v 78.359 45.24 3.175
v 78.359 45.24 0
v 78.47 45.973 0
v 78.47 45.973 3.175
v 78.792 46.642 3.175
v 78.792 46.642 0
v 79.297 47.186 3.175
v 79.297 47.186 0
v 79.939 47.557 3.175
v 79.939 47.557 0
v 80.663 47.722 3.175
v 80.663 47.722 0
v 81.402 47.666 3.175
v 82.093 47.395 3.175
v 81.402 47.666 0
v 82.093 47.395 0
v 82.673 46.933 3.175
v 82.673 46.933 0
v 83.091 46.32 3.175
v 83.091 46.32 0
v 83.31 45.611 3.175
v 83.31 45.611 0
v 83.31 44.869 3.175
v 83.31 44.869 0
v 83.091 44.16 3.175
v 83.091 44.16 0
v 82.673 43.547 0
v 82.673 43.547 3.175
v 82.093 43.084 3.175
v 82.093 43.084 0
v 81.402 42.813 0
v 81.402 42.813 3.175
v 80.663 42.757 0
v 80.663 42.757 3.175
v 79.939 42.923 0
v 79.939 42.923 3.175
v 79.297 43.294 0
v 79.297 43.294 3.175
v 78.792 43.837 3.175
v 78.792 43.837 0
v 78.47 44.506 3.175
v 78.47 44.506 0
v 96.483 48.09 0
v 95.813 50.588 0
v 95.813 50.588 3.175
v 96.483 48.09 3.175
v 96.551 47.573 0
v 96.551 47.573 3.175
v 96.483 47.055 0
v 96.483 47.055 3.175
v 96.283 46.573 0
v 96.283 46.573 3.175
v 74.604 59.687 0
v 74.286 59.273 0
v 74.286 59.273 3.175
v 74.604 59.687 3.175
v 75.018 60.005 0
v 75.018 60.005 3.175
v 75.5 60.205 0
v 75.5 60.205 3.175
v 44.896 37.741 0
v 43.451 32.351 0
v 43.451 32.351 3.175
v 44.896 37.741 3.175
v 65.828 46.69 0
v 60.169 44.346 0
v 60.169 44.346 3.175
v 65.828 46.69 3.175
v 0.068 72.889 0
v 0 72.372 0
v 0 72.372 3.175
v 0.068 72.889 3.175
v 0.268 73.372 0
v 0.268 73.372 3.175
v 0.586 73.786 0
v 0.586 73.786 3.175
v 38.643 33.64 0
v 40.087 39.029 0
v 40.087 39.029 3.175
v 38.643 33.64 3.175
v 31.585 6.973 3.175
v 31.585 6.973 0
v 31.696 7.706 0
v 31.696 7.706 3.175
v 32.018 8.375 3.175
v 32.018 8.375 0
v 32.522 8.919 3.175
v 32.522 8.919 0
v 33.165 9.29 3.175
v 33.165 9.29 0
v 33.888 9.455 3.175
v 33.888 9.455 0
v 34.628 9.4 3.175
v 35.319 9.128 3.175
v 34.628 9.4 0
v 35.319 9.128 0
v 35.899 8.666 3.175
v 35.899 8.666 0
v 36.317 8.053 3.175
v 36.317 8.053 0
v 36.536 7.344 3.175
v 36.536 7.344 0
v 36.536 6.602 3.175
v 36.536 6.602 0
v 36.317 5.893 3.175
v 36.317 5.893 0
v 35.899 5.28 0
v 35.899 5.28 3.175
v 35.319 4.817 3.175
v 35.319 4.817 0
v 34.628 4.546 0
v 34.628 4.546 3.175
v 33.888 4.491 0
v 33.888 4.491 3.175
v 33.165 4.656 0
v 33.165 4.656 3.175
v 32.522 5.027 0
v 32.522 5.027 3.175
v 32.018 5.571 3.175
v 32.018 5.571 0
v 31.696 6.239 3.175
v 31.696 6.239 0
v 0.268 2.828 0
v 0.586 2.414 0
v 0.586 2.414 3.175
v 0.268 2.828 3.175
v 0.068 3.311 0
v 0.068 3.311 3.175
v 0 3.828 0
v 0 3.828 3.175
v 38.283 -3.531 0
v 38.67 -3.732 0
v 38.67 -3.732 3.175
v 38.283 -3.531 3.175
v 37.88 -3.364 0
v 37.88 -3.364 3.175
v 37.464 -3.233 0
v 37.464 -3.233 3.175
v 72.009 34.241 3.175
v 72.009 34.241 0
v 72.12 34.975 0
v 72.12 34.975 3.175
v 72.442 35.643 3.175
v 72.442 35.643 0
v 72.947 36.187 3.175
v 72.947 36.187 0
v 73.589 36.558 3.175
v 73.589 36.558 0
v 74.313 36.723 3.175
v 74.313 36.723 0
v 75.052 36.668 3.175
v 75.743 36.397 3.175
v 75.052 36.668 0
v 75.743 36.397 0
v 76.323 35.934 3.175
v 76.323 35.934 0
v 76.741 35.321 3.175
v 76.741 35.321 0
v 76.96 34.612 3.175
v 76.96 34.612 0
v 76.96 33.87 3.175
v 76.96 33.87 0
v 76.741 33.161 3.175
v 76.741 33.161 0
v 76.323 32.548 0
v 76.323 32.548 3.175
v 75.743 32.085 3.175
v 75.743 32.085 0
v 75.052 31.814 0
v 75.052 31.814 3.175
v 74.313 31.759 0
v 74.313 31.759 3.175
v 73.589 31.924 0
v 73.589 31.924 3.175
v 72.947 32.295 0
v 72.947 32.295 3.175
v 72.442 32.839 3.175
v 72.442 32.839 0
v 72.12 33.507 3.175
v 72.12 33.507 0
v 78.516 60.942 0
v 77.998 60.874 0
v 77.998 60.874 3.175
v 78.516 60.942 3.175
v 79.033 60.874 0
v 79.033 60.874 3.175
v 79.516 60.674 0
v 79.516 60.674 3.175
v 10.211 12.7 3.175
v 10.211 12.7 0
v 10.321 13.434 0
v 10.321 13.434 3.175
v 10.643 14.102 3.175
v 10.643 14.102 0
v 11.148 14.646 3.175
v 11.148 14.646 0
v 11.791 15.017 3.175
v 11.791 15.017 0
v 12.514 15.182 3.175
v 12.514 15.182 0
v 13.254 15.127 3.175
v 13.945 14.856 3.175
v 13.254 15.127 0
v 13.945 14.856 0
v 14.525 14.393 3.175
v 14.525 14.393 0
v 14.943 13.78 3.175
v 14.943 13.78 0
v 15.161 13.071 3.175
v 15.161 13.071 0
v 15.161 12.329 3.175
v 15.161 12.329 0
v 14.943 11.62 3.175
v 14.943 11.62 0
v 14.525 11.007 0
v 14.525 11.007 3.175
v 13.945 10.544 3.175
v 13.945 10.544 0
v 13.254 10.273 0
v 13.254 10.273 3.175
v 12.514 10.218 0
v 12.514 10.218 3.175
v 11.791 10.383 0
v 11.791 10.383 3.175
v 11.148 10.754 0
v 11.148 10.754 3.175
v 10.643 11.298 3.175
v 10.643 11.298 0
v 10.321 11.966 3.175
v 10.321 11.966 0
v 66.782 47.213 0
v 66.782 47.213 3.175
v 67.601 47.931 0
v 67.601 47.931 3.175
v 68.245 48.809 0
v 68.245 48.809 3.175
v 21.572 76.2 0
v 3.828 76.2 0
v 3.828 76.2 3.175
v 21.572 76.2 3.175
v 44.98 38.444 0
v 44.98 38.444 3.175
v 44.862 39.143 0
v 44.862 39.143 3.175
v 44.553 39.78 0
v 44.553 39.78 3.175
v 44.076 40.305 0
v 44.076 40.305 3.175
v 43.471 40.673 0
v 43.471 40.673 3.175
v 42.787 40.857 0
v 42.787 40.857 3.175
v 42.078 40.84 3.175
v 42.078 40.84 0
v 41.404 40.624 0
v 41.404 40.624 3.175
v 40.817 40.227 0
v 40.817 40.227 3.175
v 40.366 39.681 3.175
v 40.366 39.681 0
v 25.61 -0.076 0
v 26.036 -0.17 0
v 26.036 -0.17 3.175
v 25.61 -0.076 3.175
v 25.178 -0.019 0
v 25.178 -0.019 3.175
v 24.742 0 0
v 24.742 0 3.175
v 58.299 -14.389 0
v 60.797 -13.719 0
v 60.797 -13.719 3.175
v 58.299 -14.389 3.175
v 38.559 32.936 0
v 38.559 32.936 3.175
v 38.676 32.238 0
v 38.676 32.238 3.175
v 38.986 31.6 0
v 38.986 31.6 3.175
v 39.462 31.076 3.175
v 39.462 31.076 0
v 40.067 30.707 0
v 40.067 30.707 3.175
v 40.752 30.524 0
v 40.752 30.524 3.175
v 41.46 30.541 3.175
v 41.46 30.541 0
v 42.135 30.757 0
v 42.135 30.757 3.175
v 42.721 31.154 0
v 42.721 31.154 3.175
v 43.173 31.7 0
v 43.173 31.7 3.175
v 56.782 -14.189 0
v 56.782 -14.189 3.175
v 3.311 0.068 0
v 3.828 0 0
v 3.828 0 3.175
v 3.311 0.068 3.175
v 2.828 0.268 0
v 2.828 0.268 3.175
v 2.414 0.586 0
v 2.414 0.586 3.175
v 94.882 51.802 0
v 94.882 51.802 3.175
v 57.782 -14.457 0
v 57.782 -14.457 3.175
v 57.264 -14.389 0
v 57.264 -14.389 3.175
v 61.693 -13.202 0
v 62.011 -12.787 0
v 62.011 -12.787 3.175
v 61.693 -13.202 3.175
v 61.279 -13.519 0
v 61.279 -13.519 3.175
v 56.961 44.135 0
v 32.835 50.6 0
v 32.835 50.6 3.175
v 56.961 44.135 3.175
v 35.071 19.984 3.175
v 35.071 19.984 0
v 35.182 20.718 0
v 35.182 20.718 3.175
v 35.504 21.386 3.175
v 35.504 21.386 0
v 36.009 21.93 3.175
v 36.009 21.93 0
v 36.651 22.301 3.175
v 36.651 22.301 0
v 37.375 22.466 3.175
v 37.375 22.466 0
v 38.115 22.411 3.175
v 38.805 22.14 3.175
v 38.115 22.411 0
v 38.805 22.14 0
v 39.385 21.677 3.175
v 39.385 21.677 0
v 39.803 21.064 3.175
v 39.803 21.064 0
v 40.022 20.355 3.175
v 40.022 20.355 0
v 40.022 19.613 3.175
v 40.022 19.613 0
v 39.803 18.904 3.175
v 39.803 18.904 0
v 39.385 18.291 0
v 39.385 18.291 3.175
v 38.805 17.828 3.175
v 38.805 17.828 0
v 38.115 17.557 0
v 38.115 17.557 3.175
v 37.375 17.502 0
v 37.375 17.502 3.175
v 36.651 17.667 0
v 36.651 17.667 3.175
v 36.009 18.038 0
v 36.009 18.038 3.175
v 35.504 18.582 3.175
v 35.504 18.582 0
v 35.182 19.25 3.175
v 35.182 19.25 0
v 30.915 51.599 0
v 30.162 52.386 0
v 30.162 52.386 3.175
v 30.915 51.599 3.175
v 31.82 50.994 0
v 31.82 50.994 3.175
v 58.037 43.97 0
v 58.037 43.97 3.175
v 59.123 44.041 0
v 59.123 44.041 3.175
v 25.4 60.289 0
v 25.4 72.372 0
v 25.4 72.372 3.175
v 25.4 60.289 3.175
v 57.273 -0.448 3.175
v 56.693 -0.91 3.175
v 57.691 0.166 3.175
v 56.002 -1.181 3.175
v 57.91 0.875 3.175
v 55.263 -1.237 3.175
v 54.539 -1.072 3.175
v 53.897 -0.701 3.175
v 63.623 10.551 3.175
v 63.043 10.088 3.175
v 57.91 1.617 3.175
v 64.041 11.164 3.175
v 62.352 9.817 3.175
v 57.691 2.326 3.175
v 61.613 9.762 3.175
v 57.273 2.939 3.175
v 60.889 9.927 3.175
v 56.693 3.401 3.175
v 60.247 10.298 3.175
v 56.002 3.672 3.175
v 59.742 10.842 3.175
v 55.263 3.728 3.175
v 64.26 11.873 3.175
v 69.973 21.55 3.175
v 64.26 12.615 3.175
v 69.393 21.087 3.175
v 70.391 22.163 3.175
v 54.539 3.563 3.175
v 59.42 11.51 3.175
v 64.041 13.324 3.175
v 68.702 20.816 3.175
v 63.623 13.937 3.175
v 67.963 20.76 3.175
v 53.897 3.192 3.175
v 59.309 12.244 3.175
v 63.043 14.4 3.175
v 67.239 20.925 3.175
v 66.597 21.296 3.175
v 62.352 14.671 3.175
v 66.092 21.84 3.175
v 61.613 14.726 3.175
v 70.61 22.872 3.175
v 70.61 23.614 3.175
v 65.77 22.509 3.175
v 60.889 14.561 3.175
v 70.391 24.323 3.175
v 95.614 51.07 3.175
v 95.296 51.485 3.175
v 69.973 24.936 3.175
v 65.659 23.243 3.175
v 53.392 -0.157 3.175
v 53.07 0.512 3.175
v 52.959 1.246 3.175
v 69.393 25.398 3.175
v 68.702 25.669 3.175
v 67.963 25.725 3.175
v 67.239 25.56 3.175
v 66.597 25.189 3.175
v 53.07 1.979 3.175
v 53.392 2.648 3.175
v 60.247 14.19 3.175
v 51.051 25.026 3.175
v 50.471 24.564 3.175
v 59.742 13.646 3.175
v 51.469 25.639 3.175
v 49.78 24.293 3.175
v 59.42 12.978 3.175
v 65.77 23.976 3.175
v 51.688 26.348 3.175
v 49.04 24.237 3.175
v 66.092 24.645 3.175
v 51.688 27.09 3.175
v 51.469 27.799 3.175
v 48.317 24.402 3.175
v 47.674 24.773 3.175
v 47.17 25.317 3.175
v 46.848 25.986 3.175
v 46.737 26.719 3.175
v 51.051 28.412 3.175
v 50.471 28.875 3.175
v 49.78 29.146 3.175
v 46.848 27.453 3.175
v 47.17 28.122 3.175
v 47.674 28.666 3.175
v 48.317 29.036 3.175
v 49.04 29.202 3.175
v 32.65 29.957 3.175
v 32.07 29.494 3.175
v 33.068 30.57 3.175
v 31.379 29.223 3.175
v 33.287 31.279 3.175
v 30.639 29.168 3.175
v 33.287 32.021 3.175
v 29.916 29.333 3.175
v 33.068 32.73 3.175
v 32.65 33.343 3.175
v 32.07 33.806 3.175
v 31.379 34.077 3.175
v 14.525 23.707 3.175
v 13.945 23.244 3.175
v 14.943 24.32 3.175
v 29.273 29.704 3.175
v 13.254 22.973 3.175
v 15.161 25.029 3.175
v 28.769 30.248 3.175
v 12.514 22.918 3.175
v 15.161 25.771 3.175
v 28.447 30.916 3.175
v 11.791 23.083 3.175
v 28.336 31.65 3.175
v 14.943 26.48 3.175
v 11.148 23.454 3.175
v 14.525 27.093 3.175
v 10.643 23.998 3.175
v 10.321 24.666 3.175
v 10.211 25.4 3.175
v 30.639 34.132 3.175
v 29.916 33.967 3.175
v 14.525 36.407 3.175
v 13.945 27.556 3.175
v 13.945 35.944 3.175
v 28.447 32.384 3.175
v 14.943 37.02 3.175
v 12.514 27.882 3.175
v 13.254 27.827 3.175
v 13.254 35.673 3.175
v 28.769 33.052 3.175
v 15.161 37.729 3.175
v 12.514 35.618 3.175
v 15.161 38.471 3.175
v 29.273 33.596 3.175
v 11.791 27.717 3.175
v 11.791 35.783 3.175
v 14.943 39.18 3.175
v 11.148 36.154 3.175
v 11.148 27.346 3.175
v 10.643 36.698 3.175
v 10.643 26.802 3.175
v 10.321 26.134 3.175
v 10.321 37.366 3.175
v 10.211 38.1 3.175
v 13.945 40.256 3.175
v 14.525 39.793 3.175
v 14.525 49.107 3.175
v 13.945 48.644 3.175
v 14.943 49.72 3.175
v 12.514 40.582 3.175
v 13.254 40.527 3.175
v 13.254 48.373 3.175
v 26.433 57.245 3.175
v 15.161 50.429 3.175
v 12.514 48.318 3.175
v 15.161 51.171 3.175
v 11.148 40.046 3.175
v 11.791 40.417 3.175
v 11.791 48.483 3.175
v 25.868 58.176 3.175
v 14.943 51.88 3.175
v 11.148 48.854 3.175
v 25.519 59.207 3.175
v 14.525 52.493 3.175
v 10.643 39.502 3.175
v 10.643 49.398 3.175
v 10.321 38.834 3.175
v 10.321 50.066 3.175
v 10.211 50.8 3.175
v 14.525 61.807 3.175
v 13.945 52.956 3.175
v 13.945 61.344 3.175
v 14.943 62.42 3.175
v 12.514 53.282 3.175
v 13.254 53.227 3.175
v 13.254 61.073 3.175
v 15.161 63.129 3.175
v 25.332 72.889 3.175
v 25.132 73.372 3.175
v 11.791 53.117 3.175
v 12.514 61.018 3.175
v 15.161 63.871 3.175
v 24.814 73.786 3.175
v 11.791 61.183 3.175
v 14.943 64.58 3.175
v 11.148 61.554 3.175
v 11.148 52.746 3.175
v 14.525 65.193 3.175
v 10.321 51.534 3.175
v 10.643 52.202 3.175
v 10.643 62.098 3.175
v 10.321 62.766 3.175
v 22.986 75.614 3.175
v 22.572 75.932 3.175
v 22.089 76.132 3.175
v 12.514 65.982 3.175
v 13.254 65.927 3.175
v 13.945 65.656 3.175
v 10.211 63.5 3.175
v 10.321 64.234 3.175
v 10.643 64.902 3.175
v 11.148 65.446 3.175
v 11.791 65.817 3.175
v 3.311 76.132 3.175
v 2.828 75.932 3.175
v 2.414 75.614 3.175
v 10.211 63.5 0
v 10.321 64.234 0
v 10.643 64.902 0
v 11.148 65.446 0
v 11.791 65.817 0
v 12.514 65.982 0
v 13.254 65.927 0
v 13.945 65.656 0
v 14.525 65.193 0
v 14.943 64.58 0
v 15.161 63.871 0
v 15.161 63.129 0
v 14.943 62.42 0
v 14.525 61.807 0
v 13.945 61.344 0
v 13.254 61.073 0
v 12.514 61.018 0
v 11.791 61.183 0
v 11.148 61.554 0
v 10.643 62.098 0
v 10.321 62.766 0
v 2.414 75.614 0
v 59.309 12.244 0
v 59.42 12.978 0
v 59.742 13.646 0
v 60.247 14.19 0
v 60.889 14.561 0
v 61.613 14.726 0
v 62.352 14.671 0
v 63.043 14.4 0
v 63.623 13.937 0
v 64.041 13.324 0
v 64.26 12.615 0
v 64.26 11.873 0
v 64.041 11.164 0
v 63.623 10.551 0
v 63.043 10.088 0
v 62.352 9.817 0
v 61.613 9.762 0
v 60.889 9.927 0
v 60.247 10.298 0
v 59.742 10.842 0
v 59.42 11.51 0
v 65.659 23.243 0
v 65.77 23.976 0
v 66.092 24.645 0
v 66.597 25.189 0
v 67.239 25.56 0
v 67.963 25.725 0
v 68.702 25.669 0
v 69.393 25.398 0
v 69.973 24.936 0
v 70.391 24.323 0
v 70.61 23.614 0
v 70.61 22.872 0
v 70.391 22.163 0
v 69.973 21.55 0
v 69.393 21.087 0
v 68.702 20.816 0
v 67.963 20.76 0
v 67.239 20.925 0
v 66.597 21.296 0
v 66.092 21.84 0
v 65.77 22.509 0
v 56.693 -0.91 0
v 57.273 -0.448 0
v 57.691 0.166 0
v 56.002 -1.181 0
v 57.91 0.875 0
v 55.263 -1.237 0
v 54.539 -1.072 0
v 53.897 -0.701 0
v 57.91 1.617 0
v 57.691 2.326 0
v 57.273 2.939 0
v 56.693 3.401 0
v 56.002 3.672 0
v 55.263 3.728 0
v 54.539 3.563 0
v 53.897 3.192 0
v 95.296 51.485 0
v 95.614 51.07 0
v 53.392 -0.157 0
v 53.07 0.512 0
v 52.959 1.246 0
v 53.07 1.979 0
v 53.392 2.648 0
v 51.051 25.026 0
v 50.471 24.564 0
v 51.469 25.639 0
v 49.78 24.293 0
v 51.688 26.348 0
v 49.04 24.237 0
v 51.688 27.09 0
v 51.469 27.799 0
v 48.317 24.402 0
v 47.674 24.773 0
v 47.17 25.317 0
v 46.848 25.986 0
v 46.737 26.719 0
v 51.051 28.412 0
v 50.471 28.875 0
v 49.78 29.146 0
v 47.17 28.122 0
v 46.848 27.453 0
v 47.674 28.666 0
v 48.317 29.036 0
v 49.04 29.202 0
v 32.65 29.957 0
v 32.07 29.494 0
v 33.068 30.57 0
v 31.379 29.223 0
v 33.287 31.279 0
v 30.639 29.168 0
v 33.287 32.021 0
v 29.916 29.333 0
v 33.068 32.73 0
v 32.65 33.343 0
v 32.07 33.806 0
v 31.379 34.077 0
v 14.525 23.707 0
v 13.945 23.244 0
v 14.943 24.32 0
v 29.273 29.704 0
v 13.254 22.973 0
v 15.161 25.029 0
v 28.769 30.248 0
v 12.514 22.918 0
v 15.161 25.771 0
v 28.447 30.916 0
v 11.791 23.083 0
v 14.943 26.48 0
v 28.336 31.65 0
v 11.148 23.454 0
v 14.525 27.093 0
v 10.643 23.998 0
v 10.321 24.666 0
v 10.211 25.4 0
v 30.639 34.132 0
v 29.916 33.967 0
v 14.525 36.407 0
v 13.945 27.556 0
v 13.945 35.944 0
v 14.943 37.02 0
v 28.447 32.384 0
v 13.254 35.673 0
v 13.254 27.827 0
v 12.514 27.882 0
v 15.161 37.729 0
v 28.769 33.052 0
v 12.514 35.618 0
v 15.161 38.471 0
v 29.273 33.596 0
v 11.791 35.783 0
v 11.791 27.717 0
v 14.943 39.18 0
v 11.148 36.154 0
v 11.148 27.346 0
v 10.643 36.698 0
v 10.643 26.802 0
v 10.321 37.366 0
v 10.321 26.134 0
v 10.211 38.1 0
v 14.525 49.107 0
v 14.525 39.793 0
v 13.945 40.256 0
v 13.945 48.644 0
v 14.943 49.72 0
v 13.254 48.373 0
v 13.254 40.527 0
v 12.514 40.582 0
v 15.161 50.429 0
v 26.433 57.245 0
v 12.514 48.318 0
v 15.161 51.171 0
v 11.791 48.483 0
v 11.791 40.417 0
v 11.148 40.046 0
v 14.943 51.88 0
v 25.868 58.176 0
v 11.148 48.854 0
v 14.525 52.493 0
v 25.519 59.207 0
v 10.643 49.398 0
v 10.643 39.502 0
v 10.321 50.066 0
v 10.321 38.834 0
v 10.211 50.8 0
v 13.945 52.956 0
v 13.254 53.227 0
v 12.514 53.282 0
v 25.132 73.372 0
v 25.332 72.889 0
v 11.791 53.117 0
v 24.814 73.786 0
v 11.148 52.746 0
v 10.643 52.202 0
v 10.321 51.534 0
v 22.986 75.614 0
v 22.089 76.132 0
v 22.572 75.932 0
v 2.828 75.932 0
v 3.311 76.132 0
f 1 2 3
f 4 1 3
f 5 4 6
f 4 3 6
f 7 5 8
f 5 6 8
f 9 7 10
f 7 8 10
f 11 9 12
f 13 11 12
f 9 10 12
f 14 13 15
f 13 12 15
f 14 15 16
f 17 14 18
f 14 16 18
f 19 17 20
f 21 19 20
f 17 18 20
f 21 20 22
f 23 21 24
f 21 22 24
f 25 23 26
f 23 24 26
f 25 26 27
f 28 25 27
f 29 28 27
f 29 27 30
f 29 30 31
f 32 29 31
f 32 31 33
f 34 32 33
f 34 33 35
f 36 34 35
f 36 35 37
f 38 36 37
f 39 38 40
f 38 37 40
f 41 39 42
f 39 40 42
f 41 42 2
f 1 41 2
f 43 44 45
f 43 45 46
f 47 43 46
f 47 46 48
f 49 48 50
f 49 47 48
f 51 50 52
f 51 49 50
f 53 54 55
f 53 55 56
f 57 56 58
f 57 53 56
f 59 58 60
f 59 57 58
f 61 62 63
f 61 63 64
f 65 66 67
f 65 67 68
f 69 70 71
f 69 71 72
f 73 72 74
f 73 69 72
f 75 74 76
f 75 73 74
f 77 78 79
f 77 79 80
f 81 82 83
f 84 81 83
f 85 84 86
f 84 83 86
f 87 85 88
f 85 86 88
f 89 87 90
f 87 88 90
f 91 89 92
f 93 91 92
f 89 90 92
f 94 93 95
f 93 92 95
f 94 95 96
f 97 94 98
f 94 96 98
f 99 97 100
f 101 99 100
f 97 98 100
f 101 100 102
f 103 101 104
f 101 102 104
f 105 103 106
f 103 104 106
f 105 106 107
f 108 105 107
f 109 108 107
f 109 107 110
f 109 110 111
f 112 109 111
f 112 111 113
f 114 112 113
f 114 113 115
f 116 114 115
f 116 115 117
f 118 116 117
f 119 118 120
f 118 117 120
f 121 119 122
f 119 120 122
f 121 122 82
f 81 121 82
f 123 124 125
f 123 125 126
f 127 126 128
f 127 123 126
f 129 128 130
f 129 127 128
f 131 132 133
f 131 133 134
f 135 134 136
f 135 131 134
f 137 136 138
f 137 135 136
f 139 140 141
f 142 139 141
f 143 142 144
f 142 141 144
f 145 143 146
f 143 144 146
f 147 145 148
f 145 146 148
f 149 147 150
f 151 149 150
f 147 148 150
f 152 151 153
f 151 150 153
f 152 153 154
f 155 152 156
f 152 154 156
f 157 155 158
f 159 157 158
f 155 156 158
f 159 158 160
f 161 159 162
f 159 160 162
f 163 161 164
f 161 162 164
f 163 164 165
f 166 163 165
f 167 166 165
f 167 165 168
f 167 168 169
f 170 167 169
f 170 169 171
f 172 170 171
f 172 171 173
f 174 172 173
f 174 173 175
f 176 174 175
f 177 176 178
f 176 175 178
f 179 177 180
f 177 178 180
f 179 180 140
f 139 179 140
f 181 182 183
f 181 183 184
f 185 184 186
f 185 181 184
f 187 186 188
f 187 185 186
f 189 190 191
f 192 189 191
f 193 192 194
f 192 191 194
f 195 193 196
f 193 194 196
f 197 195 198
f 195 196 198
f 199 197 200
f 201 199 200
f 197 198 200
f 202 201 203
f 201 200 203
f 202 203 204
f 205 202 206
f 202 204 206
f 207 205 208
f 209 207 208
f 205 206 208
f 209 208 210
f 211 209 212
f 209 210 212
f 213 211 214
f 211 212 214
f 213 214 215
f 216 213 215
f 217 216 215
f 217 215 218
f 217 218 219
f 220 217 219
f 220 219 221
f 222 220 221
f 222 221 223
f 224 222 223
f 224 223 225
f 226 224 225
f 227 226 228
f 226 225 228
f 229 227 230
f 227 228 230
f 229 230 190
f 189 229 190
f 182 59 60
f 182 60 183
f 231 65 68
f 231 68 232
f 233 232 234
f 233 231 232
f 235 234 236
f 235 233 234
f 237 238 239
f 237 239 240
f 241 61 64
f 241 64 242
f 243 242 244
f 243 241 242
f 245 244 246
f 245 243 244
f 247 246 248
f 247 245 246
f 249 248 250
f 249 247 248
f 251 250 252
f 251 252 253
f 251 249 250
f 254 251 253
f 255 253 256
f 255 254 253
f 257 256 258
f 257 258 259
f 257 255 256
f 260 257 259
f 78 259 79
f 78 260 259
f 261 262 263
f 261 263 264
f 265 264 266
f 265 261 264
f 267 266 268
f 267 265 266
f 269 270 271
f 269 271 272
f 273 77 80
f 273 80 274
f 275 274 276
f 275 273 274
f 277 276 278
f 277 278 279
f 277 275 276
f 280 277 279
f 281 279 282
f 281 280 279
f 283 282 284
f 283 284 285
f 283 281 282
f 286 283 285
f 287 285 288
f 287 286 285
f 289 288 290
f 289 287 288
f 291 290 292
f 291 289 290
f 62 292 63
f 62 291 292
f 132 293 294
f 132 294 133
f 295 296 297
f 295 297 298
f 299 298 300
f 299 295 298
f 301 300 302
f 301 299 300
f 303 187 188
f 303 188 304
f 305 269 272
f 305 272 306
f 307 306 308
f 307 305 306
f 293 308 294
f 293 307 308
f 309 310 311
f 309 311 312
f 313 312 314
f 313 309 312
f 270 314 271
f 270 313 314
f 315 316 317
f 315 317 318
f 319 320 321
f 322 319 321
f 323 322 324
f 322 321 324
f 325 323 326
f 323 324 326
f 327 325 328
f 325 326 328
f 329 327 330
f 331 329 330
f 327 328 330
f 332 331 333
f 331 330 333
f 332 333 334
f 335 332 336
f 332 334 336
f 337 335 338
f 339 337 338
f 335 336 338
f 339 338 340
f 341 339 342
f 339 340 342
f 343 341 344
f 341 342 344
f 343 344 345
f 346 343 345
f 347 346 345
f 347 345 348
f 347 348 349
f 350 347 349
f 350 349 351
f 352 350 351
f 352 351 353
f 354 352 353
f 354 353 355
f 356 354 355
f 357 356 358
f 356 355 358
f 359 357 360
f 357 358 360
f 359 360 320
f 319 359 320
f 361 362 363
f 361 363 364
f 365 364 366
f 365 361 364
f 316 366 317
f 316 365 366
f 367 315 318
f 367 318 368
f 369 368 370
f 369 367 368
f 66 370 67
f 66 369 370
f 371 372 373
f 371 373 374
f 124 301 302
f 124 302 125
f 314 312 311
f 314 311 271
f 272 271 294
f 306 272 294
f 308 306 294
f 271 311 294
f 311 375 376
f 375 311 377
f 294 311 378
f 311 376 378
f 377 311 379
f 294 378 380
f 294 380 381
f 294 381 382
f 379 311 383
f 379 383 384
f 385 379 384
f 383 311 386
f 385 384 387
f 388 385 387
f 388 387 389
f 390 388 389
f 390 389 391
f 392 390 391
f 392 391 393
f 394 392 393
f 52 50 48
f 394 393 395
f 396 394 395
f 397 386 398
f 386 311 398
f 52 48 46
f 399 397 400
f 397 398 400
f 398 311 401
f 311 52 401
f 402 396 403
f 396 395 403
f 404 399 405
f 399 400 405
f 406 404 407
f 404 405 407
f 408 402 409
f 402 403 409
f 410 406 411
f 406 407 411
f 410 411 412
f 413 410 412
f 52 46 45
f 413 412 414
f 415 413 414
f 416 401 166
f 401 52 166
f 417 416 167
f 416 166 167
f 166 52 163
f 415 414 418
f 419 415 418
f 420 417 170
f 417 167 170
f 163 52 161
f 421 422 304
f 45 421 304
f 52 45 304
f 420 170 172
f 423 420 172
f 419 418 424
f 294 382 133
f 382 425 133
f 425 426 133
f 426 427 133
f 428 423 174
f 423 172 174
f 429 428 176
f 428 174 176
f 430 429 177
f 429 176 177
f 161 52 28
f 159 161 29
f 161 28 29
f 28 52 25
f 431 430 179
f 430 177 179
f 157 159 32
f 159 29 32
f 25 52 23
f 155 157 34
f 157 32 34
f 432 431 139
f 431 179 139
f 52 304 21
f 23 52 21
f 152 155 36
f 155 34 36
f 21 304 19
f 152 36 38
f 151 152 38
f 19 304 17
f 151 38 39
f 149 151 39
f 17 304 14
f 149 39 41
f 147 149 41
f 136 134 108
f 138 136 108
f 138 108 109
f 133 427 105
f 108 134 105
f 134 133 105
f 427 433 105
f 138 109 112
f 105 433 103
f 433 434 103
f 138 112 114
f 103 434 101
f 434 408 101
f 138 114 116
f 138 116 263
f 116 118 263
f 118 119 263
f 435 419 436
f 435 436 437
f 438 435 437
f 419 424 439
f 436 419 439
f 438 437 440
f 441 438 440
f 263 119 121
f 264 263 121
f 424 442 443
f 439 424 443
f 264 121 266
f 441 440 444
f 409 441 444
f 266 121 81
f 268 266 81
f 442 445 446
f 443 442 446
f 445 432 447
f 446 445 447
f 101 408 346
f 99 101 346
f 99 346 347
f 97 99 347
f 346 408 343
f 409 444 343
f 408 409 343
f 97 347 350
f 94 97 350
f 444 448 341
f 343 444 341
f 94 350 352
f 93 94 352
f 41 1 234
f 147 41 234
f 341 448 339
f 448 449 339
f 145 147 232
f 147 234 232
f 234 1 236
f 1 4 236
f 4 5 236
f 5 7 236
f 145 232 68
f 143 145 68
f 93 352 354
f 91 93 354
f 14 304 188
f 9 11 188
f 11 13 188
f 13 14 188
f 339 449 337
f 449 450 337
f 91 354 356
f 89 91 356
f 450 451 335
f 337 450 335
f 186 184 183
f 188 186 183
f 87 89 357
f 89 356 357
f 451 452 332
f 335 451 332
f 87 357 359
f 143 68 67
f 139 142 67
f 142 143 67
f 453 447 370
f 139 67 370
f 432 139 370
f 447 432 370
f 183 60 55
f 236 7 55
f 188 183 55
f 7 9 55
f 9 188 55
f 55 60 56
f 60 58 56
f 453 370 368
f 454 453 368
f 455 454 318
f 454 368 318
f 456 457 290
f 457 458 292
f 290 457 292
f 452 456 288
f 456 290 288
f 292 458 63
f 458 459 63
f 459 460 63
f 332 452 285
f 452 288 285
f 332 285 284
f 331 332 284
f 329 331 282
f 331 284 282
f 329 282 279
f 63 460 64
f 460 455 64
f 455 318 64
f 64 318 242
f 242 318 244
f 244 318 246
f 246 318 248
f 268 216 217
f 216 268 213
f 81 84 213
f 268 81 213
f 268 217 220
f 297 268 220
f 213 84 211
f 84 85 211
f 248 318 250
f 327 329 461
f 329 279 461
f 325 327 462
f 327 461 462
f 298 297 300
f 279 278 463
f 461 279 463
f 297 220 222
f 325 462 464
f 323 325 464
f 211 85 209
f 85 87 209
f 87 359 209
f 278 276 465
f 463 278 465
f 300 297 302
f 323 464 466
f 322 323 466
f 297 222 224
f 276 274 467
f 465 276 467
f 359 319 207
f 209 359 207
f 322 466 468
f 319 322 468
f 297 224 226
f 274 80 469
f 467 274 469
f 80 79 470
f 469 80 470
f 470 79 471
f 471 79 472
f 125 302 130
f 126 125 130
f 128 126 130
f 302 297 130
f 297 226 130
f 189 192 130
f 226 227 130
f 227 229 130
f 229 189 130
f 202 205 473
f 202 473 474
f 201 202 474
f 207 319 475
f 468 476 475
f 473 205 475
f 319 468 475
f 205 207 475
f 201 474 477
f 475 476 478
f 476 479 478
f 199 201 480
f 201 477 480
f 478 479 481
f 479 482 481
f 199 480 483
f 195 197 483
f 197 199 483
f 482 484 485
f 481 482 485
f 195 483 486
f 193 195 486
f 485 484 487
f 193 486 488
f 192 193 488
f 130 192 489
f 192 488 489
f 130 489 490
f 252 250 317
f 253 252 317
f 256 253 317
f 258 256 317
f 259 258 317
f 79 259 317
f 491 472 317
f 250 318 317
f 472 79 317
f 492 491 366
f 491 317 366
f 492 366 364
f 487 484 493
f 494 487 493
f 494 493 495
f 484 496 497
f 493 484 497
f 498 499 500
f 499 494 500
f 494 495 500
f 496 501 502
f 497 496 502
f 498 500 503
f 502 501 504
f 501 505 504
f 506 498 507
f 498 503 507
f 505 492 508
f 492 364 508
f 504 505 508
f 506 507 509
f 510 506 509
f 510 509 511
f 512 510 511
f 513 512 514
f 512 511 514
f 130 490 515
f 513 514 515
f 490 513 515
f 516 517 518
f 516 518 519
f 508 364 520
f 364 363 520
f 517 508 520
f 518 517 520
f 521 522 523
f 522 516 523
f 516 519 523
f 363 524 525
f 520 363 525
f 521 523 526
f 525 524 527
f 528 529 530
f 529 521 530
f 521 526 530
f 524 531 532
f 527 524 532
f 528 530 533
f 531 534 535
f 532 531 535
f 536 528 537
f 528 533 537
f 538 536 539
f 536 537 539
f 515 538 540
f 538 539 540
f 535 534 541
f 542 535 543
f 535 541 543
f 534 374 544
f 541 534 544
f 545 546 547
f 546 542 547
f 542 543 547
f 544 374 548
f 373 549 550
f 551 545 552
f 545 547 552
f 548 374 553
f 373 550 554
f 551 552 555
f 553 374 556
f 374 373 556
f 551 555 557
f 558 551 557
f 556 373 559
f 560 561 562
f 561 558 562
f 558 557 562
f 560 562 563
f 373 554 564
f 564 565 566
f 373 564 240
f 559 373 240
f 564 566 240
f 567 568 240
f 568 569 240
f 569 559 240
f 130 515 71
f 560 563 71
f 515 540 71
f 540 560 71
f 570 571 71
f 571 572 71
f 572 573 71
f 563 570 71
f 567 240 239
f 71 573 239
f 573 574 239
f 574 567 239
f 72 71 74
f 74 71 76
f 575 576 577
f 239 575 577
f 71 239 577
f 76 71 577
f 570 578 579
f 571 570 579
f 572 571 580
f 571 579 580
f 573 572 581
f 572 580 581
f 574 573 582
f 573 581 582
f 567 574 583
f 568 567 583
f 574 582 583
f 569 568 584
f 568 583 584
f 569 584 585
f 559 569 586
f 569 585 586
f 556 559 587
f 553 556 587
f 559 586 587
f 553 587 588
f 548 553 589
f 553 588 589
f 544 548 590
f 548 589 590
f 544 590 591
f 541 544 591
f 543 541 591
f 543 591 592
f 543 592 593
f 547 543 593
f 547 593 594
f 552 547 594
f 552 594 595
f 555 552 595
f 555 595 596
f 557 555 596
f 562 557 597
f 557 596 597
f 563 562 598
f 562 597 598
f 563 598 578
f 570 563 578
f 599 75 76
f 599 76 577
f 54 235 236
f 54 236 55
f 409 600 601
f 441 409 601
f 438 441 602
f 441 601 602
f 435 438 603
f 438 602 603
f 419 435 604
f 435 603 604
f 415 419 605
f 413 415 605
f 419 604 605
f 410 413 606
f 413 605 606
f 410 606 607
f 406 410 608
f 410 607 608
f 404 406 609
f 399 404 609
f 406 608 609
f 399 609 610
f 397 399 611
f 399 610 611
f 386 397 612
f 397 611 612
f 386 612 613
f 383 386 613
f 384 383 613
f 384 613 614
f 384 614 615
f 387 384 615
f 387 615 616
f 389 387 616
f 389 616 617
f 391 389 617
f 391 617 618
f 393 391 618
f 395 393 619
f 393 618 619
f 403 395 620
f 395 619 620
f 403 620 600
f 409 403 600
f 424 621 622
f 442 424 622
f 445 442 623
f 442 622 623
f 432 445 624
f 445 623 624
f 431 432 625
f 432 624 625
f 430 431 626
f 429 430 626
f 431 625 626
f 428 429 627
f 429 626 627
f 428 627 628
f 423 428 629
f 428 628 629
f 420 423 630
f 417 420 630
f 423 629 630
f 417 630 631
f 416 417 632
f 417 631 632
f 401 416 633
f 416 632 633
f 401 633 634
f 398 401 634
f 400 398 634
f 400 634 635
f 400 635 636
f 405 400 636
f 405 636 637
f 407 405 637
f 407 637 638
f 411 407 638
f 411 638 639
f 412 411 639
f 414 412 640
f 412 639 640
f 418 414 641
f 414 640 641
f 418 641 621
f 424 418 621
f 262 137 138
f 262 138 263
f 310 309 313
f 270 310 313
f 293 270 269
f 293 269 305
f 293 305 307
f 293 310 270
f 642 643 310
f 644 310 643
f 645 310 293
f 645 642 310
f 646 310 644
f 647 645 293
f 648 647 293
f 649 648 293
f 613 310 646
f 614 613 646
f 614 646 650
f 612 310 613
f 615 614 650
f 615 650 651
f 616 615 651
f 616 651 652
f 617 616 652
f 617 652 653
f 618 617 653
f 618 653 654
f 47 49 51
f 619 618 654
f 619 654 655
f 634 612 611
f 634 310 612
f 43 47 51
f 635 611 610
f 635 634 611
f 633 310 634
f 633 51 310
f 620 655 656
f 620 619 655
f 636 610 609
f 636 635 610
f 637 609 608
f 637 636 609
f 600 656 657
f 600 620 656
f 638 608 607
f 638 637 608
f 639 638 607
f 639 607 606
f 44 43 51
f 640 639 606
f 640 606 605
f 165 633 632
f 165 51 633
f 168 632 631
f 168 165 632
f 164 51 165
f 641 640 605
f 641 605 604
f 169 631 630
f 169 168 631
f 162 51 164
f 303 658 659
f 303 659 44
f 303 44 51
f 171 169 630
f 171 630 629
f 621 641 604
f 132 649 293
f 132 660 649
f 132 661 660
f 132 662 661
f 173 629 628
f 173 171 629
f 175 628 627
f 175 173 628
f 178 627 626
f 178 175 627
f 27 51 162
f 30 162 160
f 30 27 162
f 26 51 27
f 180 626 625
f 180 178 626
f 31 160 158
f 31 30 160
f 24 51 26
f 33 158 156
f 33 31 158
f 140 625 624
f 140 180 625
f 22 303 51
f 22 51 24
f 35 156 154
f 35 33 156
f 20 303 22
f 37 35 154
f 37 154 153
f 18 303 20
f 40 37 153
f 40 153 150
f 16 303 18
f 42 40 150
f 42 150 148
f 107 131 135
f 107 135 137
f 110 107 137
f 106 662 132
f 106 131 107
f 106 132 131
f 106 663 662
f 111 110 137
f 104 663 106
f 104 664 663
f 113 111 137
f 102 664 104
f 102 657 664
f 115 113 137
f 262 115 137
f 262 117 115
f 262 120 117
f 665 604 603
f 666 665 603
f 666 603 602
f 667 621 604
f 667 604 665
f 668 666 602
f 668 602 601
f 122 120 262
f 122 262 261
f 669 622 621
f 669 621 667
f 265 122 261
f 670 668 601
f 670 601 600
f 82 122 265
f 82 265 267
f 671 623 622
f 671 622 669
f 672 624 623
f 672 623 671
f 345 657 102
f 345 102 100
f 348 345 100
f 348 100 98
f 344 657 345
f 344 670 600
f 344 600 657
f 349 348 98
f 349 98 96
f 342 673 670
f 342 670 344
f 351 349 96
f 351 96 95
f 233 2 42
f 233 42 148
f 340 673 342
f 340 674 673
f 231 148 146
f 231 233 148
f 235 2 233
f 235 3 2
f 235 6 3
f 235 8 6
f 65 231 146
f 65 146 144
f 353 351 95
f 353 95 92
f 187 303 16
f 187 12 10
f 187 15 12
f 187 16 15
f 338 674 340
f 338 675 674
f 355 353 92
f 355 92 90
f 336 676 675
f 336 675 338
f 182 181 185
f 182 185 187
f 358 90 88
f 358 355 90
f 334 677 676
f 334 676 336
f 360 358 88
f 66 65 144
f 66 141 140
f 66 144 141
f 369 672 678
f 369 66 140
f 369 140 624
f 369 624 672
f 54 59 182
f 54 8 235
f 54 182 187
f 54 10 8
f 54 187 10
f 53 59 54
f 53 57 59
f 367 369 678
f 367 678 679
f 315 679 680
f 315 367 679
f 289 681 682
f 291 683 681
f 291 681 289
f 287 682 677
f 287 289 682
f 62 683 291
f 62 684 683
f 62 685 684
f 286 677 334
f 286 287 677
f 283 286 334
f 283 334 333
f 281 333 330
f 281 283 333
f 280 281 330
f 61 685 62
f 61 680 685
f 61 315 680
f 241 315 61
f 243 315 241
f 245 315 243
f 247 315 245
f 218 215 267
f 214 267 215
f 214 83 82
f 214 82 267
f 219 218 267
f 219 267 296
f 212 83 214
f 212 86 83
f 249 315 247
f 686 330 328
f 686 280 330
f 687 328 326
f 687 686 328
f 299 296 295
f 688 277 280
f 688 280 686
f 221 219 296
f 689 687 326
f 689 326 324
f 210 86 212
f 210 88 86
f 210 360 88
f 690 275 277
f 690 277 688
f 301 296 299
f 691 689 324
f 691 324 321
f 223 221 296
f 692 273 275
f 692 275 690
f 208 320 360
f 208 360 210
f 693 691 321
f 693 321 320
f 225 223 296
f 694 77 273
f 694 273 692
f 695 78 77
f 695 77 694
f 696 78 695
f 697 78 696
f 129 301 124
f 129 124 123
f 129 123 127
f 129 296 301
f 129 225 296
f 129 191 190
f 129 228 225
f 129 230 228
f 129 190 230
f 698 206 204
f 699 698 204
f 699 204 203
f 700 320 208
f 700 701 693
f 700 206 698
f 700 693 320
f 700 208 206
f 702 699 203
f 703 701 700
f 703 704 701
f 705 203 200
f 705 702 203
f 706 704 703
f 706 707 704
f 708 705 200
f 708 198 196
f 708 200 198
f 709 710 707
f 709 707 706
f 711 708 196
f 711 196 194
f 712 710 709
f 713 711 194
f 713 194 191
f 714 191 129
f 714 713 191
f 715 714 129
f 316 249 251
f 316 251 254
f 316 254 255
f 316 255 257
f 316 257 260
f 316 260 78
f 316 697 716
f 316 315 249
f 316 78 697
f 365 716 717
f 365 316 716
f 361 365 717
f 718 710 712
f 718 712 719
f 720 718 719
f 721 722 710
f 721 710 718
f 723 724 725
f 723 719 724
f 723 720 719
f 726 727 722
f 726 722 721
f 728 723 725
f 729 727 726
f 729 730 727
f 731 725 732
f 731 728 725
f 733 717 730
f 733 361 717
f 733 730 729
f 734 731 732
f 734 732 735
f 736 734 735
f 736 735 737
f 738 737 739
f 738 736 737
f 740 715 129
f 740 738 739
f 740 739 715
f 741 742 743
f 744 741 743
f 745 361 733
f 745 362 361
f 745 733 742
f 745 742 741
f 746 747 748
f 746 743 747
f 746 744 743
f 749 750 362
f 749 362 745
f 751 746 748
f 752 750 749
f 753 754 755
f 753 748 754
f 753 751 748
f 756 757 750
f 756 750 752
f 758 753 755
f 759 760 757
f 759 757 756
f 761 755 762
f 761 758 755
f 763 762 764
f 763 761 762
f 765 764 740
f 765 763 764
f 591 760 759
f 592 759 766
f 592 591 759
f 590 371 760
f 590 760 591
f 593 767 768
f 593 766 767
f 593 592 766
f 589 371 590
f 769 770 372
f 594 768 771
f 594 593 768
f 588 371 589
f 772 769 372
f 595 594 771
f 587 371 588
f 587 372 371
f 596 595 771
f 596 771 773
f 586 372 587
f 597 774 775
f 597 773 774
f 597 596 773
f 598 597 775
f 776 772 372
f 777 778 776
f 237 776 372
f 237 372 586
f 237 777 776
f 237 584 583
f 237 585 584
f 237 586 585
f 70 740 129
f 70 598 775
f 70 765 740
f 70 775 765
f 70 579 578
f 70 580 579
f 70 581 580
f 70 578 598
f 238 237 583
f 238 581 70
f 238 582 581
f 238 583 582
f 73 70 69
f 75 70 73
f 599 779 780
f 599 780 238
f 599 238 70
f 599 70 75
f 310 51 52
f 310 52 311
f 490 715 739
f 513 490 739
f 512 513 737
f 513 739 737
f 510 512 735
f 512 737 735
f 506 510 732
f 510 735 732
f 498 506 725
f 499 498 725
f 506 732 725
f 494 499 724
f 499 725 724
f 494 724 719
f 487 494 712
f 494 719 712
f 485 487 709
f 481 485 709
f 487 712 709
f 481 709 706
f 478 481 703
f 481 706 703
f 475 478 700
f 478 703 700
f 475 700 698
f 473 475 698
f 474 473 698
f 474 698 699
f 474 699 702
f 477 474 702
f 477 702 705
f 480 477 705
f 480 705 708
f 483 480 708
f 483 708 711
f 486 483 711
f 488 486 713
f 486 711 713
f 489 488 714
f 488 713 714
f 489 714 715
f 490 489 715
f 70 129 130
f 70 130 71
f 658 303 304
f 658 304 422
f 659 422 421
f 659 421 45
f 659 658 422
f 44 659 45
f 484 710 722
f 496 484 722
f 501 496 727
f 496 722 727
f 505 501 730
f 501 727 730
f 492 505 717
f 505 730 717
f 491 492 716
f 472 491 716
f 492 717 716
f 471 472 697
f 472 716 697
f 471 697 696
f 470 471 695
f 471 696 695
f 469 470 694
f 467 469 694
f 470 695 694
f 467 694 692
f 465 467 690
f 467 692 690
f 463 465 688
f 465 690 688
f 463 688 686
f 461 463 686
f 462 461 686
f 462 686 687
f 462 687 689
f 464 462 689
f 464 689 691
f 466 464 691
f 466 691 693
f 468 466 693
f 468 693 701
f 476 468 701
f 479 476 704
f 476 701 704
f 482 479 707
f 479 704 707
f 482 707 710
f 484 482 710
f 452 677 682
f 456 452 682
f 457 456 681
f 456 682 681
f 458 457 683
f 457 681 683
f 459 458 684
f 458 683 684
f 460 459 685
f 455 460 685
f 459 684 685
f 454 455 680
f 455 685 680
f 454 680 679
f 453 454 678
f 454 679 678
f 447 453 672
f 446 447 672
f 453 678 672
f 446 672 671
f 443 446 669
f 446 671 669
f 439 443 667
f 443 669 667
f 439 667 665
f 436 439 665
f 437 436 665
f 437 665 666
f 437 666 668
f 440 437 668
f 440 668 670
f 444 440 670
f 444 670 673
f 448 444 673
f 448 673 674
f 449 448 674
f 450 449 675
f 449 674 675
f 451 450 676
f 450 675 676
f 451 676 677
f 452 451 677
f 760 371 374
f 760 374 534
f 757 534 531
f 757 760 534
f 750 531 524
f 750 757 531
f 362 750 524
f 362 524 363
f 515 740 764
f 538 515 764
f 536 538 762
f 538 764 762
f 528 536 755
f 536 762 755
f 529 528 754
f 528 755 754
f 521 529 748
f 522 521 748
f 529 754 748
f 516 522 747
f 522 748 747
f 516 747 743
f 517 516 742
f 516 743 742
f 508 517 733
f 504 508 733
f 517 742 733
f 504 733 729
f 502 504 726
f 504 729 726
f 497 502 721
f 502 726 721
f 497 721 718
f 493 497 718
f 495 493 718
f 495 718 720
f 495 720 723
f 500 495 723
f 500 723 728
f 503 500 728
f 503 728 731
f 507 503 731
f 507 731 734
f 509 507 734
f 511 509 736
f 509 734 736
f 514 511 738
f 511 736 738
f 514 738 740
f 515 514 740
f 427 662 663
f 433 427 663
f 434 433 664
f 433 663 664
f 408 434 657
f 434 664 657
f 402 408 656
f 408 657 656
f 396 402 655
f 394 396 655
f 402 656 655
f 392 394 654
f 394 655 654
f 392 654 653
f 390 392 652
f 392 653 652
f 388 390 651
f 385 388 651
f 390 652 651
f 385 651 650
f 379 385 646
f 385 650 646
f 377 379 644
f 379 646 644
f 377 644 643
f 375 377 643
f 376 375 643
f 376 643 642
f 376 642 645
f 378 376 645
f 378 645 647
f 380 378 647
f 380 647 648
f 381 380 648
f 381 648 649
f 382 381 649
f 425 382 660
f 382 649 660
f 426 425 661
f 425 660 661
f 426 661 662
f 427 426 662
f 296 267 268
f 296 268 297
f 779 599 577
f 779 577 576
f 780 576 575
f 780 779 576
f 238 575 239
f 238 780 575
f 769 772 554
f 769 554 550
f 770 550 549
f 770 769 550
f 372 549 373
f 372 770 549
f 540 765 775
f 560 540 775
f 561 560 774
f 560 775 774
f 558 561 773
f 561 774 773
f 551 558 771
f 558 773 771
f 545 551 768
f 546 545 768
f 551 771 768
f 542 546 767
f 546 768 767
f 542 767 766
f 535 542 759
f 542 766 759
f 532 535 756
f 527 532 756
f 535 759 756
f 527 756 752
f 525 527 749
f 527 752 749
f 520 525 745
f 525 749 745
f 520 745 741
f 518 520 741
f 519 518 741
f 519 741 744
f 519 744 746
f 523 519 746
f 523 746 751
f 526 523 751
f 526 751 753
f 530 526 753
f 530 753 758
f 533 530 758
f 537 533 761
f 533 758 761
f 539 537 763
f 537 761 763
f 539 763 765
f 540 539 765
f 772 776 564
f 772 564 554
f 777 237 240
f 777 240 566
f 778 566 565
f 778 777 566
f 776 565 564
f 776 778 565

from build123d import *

# Parameters (mm, degrees)
SKETCH1_R           = 2.4892
BOSS_EXTRUDE1_DEPTH = 3.175


with BuildPart() as part:
    # Sketch1 → Boss-Extrude1 (new body)
    with BuildSketch(Plane(origin=(0, 0, 0), x_dir=(-1, 0, 0), z_dir=(0, 0, -1))):
        with BuildLine():
            Line((-2.414213562, 0.585786438), (-0.585786438, 2.414213562))
            ThreePointArc((-0.585786438, 2.414213562), (-0.152240935, 3.06306026), (0, 3.828427125))
            Line((0, 3.828427125), (0, 72.371572875))
            ThreePointArc((0, 72.371572875), (-0.152240935, 73.13693974), (-0.585786438, 73.785786438))
            Line((-0.585786438, 73.785786438), (-2.414213562, 75.614213562))
            ThreePointArc((-2.414213562, 75.614213562), (-3.06306026, 76.047759065), (-3.828427125, 76.2))
            Line((-3.828427125, 76.2), (-21.571572875, 76.2))
            ThreePointArc((-21.571572875, 76.2), (-22.33693974, 76.047759065), (-22.985786438, 75.614213562))
            Line((-22.985786438, 75.614213562), (-24.814213562, 73.785786438))
            ThreePointArc((-24.814213562, 73.785786438), (-25.247759065, 73.13693974), (-25.4, 72.371572875))
            Line((-25.4, 72.371572875), (-25.4, 60.289301259))
            ThreePointArc((-25.4, 60.289301259), (-25.665349353, 58.682103933), (-26.433233299, 57.245494114))
            Line((-26.433233299, 57.245494114), (-30.162321659, 52.385651545))
            ThreePointArc((-30.162321659, 52.385651545), (-31.351237196, 51.272110628), (-32.834993135, 50.599829559))
            Line((-32.834993135, 50.599829559), (-56.961021847, 44.135279649))
            ThreePointArc((-56.961021847, 44.135279649), (-58.582132719, 43.975614164), (-60.168534235, 44.345511117))
            Line((-60.168534235, 44.345511117), (-65.827940772, 46.68971406))
            ThreePointArc((-65.827940772, 46.68971406), (-67.211252686, 47.549912686), (-68.24465063, 48.809111723))
            Line((-68.24465063, 48.809111723), (-74.285786438, 59.272665878))
            ThreePointArc((-74.285786438, 59.272665878), (-74.800314387, 59.859372559), (-75.500199155, 60.204517531))
            Line((-75.500199155, 60.204517531), (-77.997877056, 60.873768307))
            ThreePointArc((-77.997877056, 60.873768307), (-78.776567531, 60.924806377), (-79.515515147, 60.673967462))
            Line((-79.515515147, 60.673967462), (-94.88153011, 51.802394587))
            ThreePointArc((-94.88153011, 51.802394587), (-95.46823679, 51.287866637), (-95.813381762, 50.58798187))
            Line((-95.813381762, 50.58798187), (-96.482632539, 48.090303968))
            ThreePointArc((-96.482632539, 48.090303968), (-96.533670609, 47.311613493), (-96.282831694, 46.572665878))
            Line((-96.282831694, 46.572665878), (-62.011258818, -12.787439597))
            ThreePointArc((-62.011258818, -12.787439597), (-61.496730869, -13.374146278), (-60.796846101, -13.71929125))
            Line((-60.796846101, -13.71929125), (-58.2991682, -14.388542027))
            ThreePointArc((-58.2991682, -14.388542027), (-57.520477725, -14.439580097), (-56.78153011, -14.188741182))
            Line((-56.78153011, -14.188741182), (-38.670072037, -3.732085988))
            ThreePointArc((-38.670072037, -3.732085988), (-38.083489199, -3.442815344), (-37.464167262, -3.232583875))
            Line((-37.464167262, -3.232583875), (-26.035832738, -0.170370869))
            ThreePointArc((-26.035832738, -0.170370869), (-25.394368473, -0.042775693), (-24.741737512, 0))
            Line((-24.741737512, 0), (-3.828427125, 0))
            ThreePointArc((-3.828427125, 0), (-3.06306026, 0.152240935), (-2.414213562, 0.585786438))
        make_face()
        with Locations((-12.7, 12.7)):
            Circle(SKETCH1_R, mode=Mode.SUBTRACT)
        with Locations((-61.798522628, 12.244090512)):
            Circle(SKETCH1_R, mode=Mode.SUBTRACT)
        with Locations((-74.498522628, 34.241135768)):
            Circle(SKETCH1_R, mode=Mode.SUBTRACT)
        with Locations((-12.7, 25.4)):
            Circle(SKETCH1_R, mode=Mode.SUBTRACT)
        with Locations((-80.848522628, 45.239658396)):
            Circle(SKETCH1_R, mode=Mode.SUBTRACT)
        with Locations((-68.148522628, 23.24261314)):
            Circle(SKETCH1_R, mode=Mode.SUBTRACT)
        with Locations((-55.448522628, 1.245567884)):
            Circle(SKETCH1_R, mode=Mode.SUBTRACT)
        with Locations((-12.7, 38.1)):
            Circle(SKETCH1_R, mode=Mode.SUBTRACT)
        with Locations((-30.825461194, 31.649870813)):
            Circle(SKETCH1_R, mode=Mode.SUBTRACT)
        with Locations((-12.7, 50.8)):
            Circle(SKETCH1_R, mode=Mode.SUBTRACT)
        with Locations((-12.7, 63.5)):
            Circle(SKETCH1_R, mode=Mode.SUBTRACT)
        with Locations((-49.226348185, 26.719368004)):
            Circle(SKETCH1_R, mode=Mode.SUBTRACT)
        with Locations((-37.560653285, 19.984175913)):
            Circle(SKETCH1_R, mode=Mode.SUBTRACT)
        with Locations((-34.074261314, 6.972783942)):
            Circle(SKETCH1_R, mode=Mode.SUBTRACT)
        with BuildLine():
            Line((-43.451427823, 32.351315517), (-44.895538661, 37.740810537))
            ThreePointArc((-44.895538661, 37.740810537), (-43.135408461, 40.789445471), (-40.086773527, 39.029315271))
            Line((-40.086773527, 39.029315271), (-38.642662689, 33.639820251))
            ThreePointArc((-38.642662689, 33.639820251), (-40.402792889, 30.591185317), (-43.451427823, 32.351315517))
        make_face(mode=Mode.SUBTRACT)
    extrude(amount=-BOSS_EXTRUDE1_DEPTH)


solid = part.part
